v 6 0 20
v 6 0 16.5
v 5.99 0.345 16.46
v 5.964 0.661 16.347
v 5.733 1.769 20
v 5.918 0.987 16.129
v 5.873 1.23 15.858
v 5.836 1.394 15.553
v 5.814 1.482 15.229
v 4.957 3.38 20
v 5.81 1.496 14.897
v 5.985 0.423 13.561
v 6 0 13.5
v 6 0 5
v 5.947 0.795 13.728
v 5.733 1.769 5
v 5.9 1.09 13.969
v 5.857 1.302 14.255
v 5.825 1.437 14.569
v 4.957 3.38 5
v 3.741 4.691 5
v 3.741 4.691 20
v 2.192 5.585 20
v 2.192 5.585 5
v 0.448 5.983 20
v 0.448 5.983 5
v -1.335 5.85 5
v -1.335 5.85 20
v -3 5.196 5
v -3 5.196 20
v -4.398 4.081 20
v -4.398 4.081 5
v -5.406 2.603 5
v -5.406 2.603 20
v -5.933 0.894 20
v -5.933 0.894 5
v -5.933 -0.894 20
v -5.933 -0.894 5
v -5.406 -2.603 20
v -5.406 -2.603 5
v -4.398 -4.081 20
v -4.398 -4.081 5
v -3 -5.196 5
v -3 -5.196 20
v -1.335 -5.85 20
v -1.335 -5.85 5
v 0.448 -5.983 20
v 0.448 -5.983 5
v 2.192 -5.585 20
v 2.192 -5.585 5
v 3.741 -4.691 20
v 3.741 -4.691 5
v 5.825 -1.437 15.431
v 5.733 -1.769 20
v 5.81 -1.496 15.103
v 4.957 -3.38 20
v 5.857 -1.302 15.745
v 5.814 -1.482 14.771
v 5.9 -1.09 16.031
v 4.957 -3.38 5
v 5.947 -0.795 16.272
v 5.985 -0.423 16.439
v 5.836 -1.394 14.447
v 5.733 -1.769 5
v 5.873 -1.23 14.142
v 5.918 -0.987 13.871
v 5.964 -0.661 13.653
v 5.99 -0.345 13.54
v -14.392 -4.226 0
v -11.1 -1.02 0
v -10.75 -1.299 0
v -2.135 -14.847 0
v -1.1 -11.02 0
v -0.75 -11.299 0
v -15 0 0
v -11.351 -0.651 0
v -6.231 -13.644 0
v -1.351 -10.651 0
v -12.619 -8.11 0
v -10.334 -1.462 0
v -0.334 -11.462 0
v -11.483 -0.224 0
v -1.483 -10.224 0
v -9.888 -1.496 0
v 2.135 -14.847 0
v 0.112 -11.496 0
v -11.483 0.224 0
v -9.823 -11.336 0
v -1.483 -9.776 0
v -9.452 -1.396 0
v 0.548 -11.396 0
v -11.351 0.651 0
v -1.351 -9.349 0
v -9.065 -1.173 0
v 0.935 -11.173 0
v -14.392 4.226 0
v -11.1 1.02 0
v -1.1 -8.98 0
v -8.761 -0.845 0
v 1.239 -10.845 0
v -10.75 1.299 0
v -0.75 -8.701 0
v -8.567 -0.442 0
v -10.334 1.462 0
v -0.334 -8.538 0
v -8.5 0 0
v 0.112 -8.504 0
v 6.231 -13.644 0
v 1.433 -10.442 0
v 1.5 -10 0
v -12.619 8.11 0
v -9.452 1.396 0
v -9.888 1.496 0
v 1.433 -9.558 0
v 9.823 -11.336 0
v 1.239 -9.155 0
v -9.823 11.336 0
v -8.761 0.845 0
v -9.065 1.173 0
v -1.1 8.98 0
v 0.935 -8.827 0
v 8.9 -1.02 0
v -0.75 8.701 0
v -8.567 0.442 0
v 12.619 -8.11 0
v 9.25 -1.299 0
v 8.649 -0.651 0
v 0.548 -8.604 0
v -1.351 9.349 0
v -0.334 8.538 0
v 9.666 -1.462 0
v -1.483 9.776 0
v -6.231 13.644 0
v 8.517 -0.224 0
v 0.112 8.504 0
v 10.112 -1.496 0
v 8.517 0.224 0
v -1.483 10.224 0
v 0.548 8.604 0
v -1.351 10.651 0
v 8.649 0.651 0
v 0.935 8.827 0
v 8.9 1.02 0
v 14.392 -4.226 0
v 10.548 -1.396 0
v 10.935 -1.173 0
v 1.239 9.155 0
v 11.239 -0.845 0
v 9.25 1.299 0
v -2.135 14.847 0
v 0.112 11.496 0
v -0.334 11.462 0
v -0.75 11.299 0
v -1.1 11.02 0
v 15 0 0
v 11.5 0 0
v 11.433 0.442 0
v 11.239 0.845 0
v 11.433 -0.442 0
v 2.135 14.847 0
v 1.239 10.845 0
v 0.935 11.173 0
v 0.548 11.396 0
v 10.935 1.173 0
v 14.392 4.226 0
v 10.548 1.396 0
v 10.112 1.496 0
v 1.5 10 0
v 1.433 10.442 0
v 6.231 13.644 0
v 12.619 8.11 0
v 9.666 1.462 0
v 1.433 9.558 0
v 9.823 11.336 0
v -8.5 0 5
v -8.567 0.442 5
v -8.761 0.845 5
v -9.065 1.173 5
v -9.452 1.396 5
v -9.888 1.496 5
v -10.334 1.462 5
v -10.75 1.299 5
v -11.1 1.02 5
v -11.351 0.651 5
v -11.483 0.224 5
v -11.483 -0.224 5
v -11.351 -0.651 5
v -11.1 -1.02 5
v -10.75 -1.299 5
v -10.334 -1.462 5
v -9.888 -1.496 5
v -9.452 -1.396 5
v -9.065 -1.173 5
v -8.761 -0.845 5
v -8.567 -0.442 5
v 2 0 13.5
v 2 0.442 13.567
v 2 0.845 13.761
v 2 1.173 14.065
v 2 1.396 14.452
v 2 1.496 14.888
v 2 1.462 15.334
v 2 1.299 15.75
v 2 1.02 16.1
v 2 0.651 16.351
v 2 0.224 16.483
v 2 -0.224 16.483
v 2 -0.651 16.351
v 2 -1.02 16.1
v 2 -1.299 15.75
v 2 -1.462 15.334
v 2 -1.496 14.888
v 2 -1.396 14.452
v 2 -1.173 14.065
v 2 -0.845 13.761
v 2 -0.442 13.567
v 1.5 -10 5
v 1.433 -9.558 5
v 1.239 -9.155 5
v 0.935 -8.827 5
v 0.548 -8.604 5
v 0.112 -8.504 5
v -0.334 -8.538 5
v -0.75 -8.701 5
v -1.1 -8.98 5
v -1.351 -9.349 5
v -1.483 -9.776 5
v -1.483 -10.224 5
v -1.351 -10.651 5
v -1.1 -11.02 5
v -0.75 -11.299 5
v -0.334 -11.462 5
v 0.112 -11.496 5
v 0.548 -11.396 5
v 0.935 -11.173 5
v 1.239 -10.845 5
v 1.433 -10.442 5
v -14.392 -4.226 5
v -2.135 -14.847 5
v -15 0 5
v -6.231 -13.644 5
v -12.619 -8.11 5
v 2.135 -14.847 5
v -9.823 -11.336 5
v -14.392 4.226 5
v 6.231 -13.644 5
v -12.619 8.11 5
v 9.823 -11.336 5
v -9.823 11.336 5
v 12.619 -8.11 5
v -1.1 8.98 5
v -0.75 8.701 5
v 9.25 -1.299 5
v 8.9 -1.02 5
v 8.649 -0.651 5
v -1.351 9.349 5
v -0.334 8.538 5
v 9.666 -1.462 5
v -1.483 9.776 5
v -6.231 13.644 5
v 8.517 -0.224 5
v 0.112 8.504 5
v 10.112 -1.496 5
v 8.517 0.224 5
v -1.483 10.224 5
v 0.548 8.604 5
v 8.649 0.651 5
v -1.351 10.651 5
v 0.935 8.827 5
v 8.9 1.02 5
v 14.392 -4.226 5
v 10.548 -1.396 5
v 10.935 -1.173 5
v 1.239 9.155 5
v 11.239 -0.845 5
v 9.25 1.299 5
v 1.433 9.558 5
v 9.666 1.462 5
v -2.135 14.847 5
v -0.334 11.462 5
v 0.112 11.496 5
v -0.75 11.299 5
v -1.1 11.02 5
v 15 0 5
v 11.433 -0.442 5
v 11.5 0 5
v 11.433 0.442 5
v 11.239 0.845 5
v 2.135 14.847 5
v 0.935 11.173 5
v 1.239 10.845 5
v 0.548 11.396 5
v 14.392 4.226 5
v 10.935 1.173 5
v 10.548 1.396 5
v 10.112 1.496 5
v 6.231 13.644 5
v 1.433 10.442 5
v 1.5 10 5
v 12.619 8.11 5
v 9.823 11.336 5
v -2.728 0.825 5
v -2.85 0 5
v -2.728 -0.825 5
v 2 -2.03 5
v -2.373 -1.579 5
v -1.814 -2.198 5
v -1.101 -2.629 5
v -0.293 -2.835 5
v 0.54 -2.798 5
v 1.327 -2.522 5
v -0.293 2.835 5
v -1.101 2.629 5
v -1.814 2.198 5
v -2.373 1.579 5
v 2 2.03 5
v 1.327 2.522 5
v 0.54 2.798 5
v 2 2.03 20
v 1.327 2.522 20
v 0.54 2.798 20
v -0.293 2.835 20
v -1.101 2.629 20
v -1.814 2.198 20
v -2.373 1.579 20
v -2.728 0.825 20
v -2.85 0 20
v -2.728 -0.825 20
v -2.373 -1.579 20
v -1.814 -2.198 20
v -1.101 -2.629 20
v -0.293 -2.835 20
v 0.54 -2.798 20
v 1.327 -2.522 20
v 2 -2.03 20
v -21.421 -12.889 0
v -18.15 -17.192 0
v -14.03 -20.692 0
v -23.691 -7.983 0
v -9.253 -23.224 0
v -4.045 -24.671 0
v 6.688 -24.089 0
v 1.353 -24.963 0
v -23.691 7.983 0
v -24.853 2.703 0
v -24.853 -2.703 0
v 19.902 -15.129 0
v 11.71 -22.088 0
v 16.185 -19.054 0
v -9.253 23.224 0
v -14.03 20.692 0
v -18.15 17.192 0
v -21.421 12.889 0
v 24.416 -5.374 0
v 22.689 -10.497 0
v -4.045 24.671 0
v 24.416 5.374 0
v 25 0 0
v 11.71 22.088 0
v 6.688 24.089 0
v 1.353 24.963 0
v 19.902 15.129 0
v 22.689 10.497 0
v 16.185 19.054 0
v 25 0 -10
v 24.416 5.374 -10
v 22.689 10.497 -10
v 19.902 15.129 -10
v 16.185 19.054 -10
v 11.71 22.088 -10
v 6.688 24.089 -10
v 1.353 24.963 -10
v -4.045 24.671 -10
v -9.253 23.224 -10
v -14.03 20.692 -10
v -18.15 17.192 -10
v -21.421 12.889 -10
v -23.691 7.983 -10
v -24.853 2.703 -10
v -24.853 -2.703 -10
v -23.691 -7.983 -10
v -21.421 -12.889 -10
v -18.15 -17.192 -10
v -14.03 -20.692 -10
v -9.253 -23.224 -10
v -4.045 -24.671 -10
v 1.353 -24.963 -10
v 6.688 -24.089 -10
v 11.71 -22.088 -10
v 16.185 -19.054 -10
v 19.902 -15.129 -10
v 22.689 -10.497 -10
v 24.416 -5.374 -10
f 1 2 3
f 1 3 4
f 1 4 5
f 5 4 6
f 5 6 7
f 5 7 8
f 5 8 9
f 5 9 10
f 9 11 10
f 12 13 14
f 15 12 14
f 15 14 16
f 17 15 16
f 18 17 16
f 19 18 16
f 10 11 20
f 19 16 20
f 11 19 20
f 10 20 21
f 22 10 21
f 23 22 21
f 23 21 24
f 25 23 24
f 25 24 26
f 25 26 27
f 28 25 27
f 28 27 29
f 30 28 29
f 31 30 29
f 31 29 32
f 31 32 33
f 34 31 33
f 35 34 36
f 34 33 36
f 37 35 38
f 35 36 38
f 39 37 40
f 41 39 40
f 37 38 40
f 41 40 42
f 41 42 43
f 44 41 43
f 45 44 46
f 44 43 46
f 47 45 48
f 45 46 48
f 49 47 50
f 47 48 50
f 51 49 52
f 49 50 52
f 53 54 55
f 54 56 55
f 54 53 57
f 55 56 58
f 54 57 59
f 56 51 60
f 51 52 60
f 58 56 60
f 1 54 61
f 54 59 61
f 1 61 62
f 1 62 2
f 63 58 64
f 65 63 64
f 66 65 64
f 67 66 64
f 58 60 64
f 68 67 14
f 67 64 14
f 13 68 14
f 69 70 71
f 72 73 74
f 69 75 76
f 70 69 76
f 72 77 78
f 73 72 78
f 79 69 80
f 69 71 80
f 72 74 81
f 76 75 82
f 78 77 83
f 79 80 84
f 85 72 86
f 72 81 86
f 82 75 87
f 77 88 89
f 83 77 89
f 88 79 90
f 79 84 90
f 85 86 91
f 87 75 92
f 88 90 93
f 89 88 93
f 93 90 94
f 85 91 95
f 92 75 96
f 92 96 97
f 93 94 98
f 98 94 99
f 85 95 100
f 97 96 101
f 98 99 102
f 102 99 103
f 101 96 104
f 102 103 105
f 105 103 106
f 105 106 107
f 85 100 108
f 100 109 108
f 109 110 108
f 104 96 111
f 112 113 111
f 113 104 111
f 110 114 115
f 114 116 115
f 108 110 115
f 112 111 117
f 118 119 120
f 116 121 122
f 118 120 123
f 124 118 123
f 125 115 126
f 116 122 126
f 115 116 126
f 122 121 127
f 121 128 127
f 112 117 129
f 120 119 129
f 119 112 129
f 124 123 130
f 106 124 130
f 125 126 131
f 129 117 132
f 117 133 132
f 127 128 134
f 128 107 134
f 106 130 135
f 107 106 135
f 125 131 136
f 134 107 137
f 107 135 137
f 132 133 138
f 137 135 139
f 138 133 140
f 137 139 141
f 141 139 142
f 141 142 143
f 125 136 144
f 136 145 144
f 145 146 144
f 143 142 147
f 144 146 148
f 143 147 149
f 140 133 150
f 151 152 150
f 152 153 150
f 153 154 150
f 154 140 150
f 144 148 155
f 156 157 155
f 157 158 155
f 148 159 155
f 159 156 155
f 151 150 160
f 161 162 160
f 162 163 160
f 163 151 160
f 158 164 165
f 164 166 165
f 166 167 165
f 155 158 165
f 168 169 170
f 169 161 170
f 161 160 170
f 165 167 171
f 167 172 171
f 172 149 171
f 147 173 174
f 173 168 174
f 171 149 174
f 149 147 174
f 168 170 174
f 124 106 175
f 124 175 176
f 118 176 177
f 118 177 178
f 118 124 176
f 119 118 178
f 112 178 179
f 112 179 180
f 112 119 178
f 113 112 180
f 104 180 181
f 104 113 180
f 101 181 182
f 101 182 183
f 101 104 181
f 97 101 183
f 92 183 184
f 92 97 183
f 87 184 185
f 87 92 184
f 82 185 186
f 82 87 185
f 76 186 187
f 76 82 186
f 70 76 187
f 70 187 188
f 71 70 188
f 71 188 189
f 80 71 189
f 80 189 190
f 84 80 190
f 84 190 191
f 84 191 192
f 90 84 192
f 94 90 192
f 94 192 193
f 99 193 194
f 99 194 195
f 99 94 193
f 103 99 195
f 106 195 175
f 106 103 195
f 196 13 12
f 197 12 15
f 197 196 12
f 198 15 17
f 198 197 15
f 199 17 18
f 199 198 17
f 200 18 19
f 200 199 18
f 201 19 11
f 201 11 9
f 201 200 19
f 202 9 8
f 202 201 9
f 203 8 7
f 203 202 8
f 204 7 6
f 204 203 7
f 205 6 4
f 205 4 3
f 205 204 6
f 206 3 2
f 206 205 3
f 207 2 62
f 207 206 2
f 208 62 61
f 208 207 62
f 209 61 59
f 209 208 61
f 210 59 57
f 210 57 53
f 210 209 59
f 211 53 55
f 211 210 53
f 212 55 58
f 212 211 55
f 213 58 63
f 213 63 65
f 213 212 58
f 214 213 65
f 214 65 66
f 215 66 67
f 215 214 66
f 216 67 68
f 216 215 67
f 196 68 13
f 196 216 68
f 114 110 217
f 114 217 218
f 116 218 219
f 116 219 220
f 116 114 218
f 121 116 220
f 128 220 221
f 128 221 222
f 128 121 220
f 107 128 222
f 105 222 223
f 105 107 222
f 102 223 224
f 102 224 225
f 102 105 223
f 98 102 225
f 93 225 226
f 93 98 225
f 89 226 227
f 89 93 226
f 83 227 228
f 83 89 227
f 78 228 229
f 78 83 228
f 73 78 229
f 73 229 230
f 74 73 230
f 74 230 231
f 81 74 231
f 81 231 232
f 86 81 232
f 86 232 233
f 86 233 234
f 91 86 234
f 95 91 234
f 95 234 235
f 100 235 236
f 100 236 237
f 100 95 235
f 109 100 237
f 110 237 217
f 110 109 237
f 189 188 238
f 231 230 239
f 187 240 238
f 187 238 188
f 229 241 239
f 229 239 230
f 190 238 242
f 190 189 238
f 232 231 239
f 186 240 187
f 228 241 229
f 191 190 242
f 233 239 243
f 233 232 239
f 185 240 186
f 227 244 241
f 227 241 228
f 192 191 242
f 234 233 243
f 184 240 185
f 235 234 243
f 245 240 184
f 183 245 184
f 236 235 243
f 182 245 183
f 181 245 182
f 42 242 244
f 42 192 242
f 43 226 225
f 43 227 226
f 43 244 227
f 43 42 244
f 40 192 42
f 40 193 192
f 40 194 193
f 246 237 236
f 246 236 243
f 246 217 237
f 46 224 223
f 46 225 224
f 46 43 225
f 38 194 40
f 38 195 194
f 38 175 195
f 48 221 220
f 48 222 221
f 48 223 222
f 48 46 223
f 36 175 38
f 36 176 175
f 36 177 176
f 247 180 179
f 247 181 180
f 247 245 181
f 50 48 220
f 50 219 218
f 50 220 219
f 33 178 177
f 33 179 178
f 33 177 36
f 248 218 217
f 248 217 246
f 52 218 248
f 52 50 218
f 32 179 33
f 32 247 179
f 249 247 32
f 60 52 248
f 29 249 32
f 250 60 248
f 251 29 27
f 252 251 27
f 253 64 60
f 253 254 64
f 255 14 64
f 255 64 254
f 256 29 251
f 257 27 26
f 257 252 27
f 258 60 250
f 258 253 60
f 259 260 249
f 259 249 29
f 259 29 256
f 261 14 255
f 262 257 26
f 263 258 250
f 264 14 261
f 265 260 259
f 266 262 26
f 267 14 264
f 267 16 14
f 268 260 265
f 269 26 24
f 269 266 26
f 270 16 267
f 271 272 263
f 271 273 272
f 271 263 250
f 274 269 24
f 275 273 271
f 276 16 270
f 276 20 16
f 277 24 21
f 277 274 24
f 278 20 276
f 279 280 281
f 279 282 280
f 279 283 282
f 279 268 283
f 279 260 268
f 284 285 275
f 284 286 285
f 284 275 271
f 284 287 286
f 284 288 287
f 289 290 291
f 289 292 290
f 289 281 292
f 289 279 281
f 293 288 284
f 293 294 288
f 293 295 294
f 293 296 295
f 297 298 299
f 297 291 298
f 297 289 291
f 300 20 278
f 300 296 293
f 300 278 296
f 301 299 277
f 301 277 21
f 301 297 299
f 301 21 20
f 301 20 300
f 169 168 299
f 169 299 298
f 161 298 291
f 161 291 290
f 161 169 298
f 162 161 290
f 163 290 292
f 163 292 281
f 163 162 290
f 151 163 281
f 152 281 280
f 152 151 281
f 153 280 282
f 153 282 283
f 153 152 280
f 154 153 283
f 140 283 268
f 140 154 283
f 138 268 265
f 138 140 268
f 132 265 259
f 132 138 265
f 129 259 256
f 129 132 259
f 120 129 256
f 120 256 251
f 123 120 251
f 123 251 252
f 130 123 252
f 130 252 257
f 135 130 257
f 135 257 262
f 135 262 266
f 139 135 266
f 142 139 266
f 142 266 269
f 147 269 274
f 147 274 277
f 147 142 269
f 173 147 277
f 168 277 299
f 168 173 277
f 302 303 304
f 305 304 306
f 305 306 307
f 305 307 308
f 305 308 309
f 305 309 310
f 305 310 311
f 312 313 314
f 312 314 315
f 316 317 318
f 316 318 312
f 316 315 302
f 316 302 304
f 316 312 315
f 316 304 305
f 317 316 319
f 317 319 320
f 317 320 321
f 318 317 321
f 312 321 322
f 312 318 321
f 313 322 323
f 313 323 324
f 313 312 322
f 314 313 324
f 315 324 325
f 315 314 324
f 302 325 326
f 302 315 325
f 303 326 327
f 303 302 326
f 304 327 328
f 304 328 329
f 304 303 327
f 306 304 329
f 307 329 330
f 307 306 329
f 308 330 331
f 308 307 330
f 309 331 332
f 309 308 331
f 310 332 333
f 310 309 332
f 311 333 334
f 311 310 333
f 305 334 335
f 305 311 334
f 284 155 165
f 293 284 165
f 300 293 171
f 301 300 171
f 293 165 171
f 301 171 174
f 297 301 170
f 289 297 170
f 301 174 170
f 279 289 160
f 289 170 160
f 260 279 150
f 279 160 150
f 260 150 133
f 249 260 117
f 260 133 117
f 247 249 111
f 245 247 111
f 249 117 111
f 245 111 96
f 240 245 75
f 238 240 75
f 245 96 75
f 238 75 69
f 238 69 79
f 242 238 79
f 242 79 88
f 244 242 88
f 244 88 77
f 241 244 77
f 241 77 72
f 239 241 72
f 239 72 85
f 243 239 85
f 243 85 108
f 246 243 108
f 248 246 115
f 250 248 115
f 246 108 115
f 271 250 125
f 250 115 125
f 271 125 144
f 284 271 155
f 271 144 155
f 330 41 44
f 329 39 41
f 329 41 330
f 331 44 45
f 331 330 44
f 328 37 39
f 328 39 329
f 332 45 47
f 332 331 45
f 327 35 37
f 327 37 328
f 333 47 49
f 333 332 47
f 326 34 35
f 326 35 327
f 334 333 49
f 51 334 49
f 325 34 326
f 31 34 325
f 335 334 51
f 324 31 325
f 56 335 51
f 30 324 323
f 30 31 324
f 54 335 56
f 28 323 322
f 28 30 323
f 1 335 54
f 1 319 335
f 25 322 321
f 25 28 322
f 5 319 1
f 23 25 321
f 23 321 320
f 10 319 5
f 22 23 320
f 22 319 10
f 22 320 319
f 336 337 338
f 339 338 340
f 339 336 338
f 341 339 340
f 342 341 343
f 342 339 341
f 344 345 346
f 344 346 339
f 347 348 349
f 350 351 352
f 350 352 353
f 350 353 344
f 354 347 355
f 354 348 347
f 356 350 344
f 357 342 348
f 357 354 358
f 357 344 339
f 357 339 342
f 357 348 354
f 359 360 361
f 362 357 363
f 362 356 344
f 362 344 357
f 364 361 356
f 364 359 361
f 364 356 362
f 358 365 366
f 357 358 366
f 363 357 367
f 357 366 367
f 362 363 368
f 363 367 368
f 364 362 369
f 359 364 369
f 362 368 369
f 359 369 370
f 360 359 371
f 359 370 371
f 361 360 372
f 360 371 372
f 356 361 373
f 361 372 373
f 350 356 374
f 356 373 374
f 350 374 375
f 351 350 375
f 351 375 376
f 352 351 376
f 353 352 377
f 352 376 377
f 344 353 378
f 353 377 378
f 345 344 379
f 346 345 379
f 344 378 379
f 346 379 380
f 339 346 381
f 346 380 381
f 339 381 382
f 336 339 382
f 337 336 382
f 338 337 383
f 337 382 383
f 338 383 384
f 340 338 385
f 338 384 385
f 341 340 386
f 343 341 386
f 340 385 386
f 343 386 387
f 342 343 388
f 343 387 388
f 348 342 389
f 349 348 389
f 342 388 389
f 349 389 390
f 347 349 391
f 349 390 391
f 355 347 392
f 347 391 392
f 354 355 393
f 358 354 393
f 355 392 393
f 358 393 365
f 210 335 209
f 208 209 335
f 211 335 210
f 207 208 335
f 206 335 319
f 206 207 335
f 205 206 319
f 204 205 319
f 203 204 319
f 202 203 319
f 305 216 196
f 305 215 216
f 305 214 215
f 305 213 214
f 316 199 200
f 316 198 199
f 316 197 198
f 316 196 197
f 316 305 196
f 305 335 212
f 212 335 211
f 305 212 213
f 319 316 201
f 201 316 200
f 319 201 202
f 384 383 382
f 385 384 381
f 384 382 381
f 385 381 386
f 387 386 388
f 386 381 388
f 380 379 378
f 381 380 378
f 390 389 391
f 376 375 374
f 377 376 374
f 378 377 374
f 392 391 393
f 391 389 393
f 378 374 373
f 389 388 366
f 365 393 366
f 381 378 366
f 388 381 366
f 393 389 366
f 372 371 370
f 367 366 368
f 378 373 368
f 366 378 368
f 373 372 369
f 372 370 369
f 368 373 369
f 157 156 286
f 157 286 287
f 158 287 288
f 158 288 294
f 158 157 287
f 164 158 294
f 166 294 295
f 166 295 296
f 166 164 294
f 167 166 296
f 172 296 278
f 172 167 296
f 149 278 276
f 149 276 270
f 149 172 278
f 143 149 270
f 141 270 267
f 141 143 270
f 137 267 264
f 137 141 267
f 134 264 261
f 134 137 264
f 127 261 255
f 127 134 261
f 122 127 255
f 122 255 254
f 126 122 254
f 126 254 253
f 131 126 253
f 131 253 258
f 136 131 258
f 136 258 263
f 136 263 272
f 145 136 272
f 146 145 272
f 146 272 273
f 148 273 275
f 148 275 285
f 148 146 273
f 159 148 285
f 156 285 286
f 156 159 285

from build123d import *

# Parameters (mm, degrees)
CYLINDER019_R           = 25
CYLINDER019_DEPTH       = 10
CYLINDER018_R           = 1.5
CYLINDER018_DEPTH       = 5
CYLINDER018_PITCH_ANGLE = 90
CYLINDER016_R           = 2.85
CYLINDER016_DEPTH       = 15
BOX002_W                = 11
BOX002_H                = 10
BOX002_DEPTH            = 21
CYLINDER017_R           = 6
CYLINDER017_DEPTH       = 15
CYLINDER004_R           = 1.5
CYLINDER004_DEPTH       = 5
CYLINDER003_R           = 1.5
CYLINDER003_DEPTH       = 5
CYLINDER002_R           = 1.5
CYLINDER002_DEPTH       = 5
CYLINDER001_R           = 1.5
CYLINDER001_DEPTH       = 5
CYLINDER_R              = 15
CYLINDER_DEPTH          = 5


with BuildPart() as cilindro006:
    # Cylinder019 → Cylinder019 (new body)
    with BuildSketch(Plane.XY.offset(-10)):
        Circle(CYLINDER019_R)
    extrude(amount=CYLINDER019_DEPTH)


with BuildPart() as cilindro005:
    # Cylinder018 → Cylinder018 (new body)
    with BuildSketch(Plane.XY):
        Circle(CYLINDER018_R)
    extrude(amount=CYLINDER018_DEPTH)


with BuildPart() as cilindro005_1:
    # Cylinder018 pitch: moved
    add(cilindro005.part.rotate(Axis((0, 0, 0), (0, 1, 0)), CYLINDER018_PITCH_ANGLE))


with BuildPart() as cilindro005_2:
    # Cylinder018 placement: moved
    add(cilindro005_1.part.moved(Location((1.45, 0, 15))))


with BuildPart() as cilindro003:
    # Cylinder016 → Cylinder016 (new body)
    with BuildSketch(Plane(origin=(0, -186, 0), x_dir=(1, 0, 0), z_dir=(0, 0, 1))):
        Circle(CYLINDER016_R)
    extrude(amount=CYLINDER016_DEPTH)


with BuildPart() as cubo001:
    # Box002 → Box002 (new body)
    with BuildSketch(Plane(origin=(2, -191, -2), x_dir=(1, 0, 0), z_dir=(0, 0, 1))):
        with Locations((5.5, 5)):
            Rectangle(BOX002_W, BOX002_H)
    extrude(amount=BOX002_DEPTH)


with BuildPart() as cut006:
    # Cut006 base: copy of Cubo001
    add(cubo001.part)

    # Cut006: cut Cilindro003
    add(cilindro003.part, mode=Mode.SUBTRACT)


with BuildPart() as cut007:
    # Cut005 base: copy of Cilindro003
    add(cilindro003.part)

    # Cut005: cut Cubo001
    add(cubo001.part, mode=Mode.SUBTRACT)

    # Cut007: cut Cut006
    add(cut006.part, mode=Mode.SUBTRACT)


with BuildPart() as cut007_1:
    # Cut007 placement: moved
    add(cut007.part.moved(Location((0, 186, 5))))


with BuildPart() as cut009:
    # Cylinder017 → Cylinder017 (new body)
    with BuildSketch(Plane.XY.offset(5)):
        Circle(CYLINDER017_R)
    extrude(amount=CYLINDER017_DEPTH)

    # Cut008: cut Cut007
    add(cut007_1.part, mode=Mode.SUBTRACT)

    # Cut009: cut Cilindro005
    add(cilindro005_2.part, mode=Mode.SUBTRACT)


with BuildPart() as cylinder004:
    # Cylinder004 → Cylinder004 (new body)
    with BuildSketch(Plane(origin=(0, -10, 0), x_dir=(1, 0, 0), z_dir=(0, 0, 1))):
        Circle(CYLINDER004_R)
    extrude(amount=CYLINDER004_DEPTH)


with BuildPart() as cylinder003:
    # Cylinder003 → Cylinder003 (new body)
    with BuildSketch(Plane(origin=(0, 10, 0), x_dir=(1, 0, 0), z_dir=(0, 0, 1))):
        Circle(CYLINDER003_R)
    extrude(amount=CYLINDER003_DEPTH)


with BuildPart() as cylinder002:
    # Cylinder002 → Cylinder002 (new body)
    with BuildSketch(Plane(origin=(-10, 0, 0), x_dir=(1, 0, 0), z_dir=(0, 0, 1))):
        Circle(CYLINDER002_R)
    extrude(amount=CYLINDER002_DEPTH)


with BuildPart() as cylinder001:
    # Cylinder001 → Cylinder001 (new body)
    with BuildSketch(Plane(origin=(10, 0, 0), x_dir=(1, 0, 0), z_dir=(0, 0, 1))):
        Circle(CYLINDER001_R)
    extrude(amount=CYLINDER001_DEPTH)


with BuildPart() as acople:
    # Cylinder → Cylinder (new body)
    with BuildSketch(Plane.XY):
        Circle(CYLINDER_R)
    extrude(amount=CYLINDER_DEPTH)

    # Cut: cut Cylinder001
    add(cylinder001.part, mode=Mode.SUBTRACT)

    # Cut001: cut Cylinder002
    add(cylinder002.part, mode=Mode.SUBTRACT)

    # Cut002: cut Cylinder003
    add(cylinder003.part, mode=Mode.SUBTRACT)

    # Cut003: cut Cylinder004
    add(cylinder004.part, mode=Mode.SUBTRACT)

    # Fusion: union Cut009
    add(cut009.part)


solid = Compound([cilindro006.part, acople.part])
